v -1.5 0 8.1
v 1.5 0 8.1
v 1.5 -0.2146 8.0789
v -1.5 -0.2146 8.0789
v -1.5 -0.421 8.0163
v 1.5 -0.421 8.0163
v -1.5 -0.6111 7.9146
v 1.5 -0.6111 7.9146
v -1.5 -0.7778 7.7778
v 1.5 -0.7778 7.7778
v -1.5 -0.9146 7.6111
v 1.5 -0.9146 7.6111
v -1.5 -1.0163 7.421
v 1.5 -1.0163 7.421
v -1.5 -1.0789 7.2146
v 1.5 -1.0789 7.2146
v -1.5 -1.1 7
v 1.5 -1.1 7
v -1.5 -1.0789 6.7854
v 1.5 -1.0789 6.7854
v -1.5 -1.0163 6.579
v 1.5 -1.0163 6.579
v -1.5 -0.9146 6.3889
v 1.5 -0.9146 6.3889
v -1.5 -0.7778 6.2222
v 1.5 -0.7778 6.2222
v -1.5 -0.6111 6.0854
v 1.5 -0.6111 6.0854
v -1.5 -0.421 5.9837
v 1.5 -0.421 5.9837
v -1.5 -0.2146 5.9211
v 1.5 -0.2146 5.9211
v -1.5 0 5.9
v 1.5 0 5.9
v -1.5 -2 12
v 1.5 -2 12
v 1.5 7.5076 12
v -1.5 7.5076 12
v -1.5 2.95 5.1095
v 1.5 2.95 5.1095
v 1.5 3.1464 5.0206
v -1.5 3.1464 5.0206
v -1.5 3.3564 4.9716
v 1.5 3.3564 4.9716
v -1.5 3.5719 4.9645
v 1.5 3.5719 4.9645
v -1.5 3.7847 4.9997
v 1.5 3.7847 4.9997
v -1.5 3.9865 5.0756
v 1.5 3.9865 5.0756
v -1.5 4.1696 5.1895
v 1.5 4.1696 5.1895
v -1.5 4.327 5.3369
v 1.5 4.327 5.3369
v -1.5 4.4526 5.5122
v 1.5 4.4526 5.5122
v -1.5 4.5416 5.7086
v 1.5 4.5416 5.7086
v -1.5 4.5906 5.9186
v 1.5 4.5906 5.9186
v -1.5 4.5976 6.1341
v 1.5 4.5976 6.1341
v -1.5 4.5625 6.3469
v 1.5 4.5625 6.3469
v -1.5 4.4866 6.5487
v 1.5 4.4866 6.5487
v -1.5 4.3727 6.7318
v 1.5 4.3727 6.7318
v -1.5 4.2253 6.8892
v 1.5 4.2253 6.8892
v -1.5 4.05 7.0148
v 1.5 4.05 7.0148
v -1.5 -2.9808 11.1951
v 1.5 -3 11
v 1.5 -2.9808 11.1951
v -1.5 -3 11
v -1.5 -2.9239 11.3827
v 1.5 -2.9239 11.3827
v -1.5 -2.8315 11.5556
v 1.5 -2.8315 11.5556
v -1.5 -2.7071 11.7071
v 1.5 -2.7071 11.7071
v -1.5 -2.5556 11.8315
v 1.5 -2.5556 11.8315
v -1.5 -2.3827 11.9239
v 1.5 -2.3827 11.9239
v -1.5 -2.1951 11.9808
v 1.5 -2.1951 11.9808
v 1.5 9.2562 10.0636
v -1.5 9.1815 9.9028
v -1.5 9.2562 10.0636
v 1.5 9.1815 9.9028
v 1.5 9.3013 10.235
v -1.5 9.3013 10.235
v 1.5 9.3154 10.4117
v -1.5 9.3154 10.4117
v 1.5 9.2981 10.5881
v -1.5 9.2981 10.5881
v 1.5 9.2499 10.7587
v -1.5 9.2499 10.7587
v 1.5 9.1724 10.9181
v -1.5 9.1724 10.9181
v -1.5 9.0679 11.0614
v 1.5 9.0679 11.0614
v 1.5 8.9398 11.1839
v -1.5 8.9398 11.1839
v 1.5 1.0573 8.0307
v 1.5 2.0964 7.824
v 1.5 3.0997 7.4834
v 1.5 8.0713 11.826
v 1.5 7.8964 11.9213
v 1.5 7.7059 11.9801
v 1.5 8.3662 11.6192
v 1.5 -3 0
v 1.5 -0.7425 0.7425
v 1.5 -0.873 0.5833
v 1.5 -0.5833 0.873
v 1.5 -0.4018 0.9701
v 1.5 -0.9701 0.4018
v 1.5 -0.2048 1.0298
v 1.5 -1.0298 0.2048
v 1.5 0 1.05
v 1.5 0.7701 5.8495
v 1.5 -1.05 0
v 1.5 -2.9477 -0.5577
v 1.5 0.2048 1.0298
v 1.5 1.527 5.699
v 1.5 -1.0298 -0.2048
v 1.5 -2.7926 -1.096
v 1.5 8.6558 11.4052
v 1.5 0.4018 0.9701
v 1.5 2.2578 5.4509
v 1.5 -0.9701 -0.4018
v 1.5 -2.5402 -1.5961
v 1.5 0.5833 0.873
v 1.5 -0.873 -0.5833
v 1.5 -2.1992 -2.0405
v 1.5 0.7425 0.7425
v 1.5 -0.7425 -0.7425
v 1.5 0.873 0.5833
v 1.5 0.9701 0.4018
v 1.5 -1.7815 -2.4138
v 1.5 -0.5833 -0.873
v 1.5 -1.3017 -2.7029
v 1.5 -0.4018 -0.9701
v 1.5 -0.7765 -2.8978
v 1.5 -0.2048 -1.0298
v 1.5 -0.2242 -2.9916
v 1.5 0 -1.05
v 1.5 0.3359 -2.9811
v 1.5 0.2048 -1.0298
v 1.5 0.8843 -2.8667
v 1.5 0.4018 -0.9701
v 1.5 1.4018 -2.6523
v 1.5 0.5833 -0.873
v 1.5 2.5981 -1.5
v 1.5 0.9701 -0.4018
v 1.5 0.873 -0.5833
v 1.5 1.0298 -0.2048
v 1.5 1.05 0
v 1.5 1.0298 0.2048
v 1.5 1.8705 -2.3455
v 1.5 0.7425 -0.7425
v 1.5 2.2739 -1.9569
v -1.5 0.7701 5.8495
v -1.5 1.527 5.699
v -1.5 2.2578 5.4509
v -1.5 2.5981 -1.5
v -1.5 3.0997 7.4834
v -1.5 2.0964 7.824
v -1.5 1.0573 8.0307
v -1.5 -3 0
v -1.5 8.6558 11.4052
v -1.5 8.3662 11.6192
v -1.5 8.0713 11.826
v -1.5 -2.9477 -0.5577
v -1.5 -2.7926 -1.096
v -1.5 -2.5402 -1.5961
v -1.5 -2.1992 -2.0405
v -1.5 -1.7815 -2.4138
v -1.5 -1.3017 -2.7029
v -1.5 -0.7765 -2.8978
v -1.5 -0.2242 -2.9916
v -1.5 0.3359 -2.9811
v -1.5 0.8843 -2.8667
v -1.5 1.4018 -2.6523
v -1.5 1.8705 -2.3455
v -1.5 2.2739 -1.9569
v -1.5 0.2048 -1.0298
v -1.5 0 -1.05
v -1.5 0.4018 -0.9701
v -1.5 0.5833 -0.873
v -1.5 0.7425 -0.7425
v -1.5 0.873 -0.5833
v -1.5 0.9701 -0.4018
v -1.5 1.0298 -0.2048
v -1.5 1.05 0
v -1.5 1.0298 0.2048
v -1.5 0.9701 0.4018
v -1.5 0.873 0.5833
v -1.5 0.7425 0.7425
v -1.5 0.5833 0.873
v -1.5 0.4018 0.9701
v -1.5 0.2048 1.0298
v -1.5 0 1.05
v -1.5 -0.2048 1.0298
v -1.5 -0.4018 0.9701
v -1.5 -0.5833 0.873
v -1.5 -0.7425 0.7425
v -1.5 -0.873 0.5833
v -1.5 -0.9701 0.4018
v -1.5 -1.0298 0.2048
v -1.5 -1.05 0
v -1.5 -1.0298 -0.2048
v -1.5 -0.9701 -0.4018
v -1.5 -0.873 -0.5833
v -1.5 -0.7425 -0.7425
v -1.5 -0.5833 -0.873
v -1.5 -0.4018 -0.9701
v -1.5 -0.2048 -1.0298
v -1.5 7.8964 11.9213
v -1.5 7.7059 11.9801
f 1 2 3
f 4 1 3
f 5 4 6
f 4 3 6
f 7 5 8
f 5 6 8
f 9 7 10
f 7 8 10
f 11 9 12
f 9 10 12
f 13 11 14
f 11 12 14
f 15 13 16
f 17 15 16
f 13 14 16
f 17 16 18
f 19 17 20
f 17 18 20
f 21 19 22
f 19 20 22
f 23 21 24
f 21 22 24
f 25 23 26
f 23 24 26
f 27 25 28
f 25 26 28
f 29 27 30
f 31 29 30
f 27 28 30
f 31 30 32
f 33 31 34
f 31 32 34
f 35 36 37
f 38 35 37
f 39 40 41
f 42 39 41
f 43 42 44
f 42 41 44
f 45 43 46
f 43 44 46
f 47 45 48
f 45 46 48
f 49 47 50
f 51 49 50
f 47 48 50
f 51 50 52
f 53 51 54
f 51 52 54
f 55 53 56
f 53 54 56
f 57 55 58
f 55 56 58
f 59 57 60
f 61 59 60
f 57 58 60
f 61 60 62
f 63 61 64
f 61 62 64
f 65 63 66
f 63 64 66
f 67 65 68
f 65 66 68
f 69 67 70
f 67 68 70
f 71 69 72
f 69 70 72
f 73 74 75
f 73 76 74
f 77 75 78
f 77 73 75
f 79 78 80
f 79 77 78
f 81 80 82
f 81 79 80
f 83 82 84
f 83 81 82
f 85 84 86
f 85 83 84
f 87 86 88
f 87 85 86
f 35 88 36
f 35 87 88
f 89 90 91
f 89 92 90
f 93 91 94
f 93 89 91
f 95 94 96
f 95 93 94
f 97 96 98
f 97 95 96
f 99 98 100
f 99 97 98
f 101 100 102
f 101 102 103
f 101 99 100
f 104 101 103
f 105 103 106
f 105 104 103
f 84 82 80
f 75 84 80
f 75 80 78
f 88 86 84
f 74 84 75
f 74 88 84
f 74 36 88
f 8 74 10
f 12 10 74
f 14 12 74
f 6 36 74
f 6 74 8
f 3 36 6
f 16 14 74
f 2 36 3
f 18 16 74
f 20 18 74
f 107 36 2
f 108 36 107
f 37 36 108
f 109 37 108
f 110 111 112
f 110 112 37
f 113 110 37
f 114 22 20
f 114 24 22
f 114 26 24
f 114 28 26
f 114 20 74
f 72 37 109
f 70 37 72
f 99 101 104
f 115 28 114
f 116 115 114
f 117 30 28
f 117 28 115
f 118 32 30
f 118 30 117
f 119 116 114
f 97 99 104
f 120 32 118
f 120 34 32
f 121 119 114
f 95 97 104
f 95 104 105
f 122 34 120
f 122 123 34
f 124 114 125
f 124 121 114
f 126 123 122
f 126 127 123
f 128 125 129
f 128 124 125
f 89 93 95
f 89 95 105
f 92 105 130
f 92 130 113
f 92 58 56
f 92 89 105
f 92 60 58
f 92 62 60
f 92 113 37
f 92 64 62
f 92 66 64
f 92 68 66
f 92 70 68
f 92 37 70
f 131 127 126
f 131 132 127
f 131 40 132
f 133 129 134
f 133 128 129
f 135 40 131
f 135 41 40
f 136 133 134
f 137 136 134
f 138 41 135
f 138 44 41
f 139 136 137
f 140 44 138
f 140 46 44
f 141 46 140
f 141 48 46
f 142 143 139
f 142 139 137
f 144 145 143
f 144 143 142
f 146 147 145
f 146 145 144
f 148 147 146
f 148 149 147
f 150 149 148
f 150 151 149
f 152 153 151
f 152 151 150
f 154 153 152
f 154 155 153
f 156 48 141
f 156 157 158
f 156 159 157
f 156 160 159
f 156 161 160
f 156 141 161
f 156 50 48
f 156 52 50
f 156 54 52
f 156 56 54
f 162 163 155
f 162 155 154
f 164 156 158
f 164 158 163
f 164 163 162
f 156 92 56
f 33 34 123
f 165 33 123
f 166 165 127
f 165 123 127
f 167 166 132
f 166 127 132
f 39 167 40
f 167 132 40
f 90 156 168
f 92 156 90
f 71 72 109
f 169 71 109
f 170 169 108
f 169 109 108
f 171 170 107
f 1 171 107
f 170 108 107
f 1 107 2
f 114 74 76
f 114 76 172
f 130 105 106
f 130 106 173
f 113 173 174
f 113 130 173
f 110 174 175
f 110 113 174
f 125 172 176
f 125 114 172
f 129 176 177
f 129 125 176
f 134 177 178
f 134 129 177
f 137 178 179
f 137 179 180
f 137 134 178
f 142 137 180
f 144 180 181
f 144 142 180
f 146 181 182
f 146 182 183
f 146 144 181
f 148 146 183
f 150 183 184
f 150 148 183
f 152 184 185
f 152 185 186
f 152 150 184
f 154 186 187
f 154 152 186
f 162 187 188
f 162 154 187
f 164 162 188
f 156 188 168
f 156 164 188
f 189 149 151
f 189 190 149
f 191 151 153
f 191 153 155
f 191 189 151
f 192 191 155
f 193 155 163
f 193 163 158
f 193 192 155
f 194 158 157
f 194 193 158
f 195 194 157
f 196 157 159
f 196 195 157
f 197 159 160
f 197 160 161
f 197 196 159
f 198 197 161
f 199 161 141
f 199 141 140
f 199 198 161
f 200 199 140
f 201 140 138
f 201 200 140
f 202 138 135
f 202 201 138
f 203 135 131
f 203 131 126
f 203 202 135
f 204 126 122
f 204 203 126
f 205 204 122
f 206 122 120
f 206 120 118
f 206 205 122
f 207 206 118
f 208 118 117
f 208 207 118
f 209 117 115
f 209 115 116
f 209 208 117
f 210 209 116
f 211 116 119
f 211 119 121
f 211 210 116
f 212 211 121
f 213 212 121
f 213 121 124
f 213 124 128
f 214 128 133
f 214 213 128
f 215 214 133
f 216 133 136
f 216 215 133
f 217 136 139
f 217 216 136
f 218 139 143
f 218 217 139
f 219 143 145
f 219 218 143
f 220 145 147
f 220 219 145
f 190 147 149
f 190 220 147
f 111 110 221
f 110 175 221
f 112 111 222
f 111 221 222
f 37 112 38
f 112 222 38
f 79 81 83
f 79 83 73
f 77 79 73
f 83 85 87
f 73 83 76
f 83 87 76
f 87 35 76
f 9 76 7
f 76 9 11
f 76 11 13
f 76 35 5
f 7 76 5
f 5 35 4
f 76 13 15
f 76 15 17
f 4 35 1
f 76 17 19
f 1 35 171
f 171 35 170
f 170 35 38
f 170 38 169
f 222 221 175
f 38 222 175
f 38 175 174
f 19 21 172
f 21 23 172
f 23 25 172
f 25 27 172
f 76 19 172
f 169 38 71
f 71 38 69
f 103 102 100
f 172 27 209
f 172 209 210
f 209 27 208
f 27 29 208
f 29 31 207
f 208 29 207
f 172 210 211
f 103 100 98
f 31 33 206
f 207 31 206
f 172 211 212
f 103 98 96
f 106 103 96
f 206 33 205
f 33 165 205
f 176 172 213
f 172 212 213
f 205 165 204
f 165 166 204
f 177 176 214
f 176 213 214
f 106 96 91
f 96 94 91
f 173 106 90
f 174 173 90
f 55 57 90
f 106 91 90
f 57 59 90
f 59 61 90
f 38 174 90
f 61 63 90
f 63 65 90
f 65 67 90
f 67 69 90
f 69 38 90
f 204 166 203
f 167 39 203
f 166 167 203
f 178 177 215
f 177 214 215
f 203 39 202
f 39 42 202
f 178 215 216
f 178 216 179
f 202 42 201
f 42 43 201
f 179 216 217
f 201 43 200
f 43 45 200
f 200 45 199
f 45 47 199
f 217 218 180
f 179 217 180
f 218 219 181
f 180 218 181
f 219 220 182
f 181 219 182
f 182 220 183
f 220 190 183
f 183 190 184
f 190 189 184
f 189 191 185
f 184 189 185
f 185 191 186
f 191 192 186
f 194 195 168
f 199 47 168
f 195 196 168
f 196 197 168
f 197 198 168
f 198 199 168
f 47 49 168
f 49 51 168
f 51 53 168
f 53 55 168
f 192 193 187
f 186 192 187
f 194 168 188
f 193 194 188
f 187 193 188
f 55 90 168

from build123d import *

# Parameters (mm, degrees)
SKETCH_8_R          = 1.05
EXTRUDE_4_DEPTH     = 1.5
SKETCH_14_W         = 2.317821063
SKETCH_14_H         = 10.810249676
CUT_EXTRUDE_3_DEPTH = 4
CUT_EXTRUDE_5_DEPTH = 4
FILLET_3_R          = 1


with BuildPart() as part:
    # 草图8 → 凸台-拉伸4 (new body, symmetric)
    with BuildSketch(Plane(origin=(0, 0, 0), x_dir=(0, 0, -1), z_dir=(1, 0, 0))):
        with BuildLine():
            Line((1.5, 2.598076211), (-10.624355653, 9.598076211))
            ThreePointArc((-10.624355653, 9.598076211), (-13.829953141, 3.705724776), (-14, -3))
            Line((-14, -3), (0, -3))
            ThreePointArc((0, -3), (2.897777479, -0.776457135), (1.5, 2.598076211))
        make_face()
        Circle(SKETCH_8_R, mode=Mode.SUBTRACT)
    extrude(amount=EXTRUDE_4_DEPTH, both=True)

    # 草图14 → 切除-拉伸3 (cut, through all)
    with BuildSketch(Plane(origin=(1.5, 0, 0), x_dir=(0, 0, -1), z_dir=(1, 0, 0))):
        with Locations((-13.158910532, 2.405124838)):
            Rectangle(SKETCH_14_W, SKETCH_14_H)
    extrude(amount=-CUT_EXTRUDE_3_DEPTH, mode=Mode.SUBTRACT)

    # 草图17 → 切除-拉伸5 (cut, through all)
    with BuildSketch(Plane(origin=(1.5, 0, 0), x_dir=(0, 0, -1), z_dir=(1, 0, 0))):
        with BuildLine():
            ThreePointArc((-7.014805771, 4.05), (-7.823999193, 2.096434265), (-8.1, 0))
            ThreePointArc((-8.1, 0), (-7, -1.1), (-5.9, 0))
            ThreePointArc((-5.9, 0), (-5.698962375, 1.527032366), (-5.109549882, 2.95))
            ThreePointArc((-5.109549882, 2.95), (-5.512177826, 4.452627944), (-7.014805771, 4.05))
        make_face()
    extrude(amount=-CUT_EXTRUDE_5_DEPTH, mode=Mode.SUBTRACT)

    # 圆角3
    fillet_3_edges = [part.edges().sort_by_distance(p)[0] for p in [
        (0, -3, 12),
        (0, 7.810249676, 12),
        (0, 9.598076211, 10.624355653),
    ]]
    fillet(fillet_3_edges, radius=FILLET_3_R)


solid = part.part
